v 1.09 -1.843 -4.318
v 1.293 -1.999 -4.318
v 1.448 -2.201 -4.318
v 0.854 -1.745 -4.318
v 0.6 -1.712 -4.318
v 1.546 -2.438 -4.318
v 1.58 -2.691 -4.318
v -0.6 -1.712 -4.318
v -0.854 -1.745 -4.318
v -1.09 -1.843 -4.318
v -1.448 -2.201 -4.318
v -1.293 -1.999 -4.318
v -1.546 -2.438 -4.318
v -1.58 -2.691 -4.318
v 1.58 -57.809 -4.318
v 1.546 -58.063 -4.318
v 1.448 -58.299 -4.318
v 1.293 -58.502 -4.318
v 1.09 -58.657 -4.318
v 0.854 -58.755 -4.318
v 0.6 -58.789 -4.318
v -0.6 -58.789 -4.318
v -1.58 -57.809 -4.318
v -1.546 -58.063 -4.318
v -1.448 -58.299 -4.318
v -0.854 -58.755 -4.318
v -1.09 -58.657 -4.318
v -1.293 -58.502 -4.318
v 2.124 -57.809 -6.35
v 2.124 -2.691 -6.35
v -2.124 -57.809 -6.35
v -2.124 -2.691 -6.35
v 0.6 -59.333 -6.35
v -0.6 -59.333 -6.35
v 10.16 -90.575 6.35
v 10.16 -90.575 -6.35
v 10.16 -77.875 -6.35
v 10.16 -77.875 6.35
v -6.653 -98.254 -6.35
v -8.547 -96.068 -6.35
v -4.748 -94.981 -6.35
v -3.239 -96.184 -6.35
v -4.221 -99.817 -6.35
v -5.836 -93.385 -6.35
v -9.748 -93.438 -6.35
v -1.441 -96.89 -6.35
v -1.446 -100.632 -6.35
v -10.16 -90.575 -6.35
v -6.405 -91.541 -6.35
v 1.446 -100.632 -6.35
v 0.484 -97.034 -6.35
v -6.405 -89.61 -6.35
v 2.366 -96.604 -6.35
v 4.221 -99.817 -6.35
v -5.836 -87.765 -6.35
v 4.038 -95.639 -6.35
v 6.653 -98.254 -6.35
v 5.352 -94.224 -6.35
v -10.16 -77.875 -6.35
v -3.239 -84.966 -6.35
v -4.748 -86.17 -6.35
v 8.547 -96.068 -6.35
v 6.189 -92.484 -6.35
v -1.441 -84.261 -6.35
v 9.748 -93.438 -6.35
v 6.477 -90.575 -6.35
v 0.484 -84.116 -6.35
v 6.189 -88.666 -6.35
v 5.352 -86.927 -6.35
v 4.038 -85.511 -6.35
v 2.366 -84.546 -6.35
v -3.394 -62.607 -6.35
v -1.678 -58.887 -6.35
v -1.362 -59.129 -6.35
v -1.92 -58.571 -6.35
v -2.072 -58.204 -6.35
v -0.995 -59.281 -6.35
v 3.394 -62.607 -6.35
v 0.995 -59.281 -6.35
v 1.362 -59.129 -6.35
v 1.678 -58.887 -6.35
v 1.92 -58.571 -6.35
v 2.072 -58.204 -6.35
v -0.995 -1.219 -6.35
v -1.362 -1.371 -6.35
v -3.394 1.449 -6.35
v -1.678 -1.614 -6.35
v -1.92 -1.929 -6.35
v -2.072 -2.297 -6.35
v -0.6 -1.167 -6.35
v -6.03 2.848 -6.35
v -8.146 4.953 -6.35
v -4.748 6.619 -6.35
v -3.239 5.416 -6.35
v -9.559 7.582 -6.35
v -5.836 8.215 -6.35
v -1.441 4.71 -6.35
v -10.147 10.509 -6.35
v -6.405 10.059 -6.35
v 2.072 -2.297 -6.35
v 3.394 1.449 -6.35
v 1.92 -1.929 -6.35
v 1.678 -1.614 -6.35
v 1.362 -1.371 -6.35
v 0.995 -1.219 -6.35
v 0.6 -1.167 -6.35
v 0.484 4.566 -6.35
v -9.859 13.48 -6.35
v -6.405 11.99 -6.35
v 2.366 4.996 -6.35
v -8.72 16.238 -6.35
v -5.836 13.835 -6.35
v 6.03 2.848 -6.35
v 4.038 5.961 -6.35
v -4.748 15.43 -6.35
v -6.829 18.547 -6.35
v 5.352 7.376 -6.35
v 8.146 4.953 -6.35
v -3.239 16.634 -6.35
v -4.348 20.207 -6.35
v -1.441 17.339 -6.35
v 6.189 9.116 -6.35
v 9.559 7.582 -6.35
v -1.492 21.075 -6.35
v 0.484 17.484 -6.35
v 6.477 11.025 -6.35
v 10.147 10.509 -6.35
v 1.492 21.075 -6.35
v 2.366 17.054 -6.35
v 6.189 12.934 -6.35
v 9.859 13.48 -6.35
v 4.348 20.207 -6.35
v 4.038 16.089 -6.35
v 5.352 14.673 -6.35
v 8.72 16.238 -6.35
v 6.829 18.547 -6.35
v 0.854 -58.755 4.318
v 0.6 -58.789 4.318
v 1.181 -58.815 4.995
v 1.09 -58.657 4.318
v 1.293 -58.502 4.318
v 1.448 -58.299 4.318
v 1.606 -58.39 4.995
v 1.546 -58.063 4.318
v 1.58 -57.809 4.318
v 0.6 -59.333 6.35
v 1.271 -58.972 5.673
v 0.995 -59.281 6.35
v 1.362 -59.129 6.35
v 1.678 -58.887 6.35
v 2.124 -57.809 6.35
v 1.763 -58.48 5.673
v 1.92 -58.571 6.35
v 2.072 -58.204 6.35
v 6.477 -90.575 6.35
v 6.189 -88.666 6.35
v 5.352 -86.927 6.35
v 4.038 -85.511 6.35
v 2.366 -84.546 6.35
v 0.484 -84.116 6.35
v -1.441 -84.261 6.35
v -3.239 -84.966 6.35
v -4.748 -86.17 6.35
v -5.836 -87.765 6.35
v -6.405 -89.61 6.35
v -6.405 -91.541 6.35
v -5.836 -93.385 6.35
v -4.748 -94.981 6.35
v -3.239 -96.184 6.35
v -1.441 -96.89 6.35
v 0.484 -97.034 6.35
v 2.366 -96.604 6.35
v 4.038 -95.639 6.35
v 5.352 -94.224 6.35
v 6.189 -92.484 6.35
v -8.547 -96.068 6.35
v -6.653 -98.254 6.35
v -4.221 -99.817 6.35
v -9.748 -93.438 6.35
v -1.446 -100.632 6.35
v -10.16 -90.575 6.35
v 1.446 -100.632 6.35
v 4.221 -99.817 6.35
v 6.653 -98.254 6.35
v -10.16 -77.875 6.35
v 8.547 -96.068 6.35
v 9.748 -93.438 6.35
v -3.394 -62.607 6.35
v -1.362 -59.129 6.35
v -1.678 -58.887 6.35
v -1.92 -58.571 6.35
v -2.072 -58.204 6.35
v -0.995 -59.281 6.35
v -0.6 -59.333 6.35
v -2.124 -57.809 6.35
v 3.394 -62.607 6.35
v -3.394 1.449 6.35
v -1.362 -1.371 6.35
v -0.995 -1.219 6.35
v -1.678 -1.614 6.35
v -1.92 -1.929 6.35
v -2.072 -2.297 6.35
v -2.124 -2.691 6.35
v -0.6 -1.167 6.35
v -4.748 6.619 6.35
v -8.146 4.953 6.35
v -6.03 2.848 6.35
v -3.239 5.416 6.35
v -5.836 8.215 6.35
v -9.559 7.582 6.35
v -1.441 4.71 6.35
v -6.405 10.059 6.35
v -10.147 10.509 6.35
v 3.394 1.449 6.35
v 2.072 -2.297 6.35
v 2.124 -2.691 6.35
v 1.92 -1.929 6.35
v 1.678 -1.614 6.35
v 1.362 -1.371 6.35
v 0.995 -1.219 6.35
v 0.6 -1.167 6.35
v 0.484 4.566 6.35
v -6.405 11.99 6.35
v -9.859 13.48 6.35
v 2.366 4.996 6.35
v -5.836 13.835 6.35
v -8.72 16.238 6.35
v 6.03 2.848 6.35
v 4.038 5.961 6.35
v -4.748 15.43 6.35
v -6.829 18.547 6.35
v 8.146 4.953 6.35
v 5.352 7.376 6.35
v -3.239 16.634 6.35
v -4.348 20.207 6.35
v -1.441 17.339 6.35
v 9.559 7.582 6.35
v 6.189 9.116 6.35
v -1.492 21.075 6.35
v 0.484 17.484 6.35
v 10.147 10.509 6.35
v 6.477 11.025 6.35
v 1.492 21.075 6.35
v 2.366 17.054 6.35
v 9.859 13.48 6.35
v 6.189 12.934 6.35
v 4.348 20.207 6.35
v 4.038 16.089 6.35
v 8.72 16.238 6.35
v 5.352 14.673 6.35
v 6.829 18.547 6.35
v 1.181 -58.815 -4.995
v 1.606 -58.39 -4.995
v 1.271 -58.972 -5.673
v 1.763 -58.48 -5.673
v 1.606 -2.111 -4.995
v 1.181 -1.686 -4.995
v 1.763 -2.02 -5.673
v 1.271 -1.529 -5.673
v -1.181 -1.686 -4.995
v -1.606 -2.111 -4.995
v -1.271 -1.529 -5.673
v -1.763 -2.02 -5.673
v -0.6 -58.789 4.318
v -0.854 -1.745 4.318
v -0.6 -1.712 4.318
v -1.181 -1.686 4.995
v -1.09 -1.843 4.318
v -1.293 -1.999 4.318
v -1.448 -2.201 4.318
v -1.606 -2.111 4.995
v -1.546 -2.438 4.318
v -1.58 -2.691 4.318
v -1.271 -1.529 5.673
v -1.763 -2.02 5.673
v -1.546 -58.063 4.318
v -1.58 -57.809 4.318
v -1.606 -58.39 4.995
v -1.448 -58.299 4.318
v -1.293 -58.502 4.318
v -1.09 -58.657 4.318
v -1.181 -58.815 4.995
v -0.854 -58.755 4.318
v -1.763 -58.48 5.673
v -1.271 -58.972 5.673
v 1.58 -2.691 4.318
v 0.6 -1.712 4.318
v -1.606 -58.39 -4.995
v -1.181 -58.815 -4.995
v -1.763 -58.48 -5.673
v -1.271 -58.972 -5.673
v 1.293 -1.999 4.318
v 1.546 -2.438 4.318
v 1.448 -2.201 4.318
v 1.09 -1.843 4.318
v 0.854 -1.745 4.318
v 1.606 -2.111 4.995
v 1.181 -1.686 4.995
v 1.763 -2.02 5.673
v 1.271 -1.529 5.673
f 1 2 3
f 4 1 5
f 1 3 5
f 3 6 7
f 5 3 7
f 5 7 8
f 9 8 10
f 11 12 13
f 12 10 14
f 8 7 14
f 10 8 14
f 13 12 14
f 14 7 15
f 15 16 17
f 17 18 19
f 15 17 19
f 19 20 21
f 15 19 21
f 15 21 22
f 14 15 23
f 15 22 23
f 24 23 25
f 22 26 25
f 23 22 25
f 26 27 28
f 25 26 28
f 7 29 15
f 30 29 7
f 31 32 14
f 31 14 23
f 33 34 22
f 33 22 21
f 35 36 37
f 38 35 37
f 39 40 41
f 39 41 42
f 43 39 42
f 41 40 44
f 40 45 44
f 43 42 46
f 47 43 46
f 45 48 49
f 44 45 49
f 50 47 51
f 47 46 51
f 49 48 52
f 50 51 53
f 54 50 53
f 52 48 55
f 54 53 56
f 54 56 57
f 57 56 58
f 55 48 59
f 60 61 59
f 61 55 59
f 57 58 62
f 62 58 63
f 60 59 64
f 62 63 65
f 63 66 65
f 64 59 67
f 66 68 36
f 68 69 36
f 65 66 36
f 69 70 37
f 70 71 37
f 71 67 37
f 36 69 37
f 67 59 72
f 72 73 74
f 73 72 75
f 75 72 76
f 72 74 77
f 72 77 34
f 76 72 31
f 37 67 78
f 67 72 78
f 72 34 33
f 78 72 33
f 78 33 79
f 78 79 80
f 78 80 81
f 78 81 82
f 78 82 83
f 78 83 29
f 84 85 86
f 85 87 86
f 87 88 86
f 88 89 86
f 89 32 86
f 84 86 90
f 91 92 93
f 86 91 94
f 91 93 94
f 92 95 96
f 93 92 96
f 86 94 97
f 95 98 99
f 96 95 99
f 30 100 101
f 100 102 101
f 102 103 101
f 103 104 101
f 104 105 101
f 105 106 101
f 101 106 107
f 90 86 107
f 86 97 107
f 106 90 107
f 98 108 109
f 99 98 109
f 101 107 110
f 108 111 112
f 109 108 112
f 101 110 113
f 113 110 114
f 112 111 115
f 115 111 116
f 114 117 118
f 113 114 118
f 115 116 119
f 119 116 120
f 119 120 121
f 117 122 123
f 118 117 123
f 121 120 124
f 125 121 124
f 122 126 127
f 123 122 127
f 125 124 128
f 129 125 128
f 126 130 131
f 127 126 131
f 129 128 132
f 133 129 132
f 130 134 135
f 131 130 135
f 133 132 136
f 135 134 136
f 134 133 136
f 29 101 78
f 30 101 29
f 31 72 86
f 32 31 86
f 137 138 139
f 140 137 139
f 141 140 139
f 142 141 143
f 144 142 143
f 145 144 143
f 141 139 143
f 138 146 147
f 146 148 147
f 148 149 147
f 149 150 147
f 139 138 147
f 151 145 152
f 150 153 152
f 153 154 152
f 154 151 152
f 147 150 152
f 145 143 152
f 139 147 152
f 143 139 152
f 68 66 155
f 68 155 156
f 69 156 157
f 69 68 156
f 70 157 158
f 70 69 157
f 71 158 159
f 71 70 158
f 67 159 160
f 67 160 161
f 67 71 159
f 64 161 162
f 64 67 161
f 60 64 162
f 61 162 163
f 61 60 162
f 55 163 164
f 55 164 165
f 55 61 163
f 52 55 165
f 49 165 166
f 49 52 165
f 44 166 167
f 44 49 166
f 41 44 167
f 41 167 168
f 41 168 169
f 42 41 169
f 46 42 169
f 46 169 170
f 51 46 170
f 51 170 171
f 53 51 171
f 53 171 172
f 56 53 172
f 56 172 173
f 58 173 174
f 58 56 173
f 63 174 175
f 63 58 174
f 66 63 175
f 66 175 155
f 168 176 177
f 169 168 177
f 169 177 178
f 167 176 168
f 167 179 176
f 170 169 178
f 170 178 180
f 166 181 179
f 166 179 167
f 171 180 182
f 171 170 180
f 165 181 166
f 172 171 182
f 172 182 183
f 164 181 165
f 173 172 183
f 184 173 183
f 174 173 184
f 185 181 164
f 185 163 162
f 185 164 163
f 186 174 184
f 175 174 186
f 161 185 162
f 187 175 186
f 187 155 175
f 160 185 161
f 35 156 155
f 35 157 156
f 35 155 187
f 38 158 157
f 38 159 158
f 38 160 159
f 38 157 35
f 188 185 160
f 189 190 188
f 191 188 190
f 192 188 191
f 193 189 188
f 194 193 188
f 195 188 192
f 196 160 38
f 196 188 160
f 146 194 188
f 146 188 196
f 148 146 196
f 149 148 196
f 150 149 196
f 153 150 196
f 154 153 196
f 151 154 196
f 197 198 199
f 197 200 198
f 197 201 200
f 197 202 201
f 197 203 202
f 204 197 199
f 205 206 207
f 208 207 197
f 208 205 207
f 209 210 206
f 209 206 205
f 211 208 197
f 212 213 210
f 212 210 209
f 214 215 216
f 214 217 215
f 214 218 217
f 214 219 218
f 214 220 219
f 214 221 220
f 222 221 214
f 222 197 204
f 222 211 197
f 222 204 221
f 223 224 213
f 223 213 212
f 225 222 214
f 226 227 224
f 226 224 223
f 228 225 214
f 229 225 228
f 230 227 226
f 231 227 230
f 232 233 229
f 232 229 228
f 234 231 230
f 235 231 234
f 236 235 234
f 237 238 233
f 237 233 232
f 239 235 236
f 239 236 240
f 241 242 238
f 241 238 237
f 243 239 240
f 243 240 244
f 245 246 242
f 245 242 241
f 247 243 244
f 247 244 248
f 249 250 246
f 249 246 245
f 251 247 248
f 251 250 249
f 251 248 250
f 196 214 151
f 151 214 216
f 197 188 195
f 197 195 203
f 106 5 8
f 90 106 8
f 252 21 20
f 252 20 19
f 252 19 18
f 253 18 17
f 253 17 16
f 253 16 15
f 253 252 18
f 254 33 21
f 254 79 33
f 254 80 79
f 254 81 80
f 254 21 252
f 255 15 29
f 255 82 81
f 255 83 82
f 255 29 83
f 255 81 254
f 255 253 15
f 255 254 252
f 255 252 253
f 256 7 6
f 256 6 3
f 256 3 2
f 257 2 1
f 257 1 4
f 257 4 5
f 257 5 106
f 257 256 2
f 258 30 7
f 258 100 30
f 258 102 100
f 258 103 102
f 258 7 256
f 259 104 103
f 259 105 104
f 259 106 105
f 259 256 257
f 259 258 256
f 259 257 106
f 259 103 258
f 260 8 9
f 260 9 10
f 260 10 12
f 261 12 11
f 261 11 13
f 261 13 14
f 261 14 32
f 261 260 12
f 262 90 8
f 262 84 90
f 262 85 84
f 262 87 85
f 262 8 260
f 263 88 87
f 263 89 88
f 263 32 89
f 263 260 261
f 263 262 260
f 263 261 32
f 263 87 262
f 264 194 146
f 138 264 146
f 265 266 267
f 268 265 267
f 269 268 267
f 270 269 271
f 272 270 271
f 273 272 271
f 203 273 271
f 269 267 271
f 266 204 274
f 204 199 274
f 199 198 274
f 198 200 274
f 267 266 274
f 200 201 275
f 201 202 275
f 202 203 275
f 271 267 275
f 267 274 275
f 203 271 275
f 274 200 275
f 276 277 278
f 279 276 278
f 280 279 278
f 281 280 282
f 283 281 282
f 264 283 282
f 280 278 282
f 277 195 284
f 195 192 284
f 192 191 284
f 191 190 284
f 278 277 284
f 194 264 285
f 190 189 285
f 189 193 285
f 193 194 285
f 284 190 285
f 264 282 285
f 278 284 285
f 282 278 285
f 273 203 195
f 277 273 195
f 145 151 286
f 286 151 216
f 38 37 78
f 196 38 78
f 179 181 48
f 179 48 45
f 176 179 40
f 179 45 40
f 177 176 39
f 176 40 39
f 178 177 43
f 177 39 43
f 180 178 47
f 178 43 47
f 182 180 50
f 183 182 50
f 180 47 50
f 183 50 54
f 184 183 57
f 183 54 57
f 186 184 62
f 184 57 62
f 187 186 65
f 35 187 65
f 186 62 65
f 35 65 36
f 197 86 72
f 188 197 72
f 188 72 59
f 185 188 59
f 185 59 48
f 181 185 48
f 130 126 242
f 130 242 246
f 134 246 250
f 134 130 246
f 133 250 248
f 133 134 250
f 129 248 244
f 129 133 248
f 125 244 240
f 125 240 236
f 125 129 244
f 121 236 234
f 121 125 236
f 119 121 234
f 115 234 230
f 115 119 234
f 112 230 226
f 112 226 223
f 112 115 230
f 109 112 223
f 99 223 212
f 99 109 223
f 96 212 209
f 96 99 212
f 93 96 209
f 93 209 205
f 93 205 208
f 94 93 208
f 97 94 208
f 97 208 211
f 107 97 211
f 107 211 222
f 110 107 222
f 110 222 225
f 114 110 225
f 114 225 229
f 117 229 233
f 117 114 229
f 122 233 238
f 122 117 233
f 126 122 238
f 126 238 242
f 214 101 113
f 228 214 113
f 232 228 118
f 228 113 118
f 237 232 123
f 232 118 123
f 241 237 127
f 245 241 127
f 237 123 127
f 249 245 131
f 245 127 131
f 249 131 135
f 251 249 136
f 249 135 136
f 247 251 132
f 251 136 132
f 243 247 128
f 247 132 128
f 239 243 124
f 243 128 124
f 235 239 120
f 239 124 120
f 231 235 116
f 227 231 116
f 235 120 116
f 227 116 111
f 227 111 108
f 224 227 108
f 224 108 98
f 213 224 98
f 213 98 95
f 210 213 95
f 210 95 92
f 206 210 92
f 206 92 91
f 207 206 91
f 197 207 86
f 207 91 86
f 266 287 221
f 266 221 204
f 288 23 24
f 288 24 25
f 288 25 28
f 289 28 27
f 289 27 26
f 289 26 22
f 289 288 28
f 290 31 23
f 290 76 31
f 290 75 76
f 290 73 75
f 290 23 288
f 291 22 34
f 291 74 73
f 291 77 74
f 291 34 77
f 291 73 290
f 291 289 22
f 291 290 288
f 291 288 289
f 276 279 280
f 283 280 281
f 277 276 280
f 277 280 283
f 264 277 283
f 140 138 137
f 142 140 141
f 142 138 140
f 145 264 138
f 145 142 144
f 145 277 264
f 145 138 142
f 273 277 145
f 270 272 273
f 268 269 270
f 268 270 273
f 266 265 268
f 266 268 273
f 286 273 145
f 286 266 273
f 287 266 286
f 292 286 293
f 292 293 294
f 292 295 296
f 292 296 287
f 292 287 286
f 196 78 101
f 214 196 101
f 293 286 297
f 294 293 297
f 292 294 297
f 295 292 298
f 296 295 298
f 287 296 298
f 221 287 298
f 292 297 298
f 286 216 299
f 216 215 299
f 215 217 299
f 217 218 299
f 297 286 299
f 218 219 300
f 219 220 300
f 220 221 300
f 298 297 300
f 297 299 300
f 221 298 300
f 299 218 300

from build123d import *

# Parameters (mm, degrees)
BOSS_EXTRUDE5_DEPTH      = 6.35
BOSS_EXTRUDE5_DEPTH_BACK = 6.35
SKETCH2_R                = 6.477
CUT_EXTRUDE1_DEPTH       = 2.032
CUT_EXTRUDE1_DRAFT       = -15
MIRROR1_COPY_1_DEPTH     = 2.032
MIRROR1_COPY_1_DRAFT     = -15


with BuildPart() as part:
    # Sketch2 → Boss-Extrude5 (new, two sides: drawn at the far end of the back side and taken through both)
    with BuildSketch(Plane.XY.offset(-BOSS_EXTRUDE5_DEPTH_BACK)):
        with BuildLine():
            Line((10.16, -90.575195917), (10.16, -77.875195917))
            Line((10.16, -77.875195917), (3.394151371, -62.607190679))
            Line((3.394151371, -62.607190679), (3.394151371, 1.448513754))
            ThreePointArc((3.394151371, 1.448513754), (0, 21.184804083), (-3.394151371, 1.448513754))
            Line((-3.394151371, 1.448513754), (-3.394151371, -62.607190679))
            Line((-3.394151371, -62.607190679), (-10.16, -77.875195917))
            Line((-10.16, -77.875195917), (-10.16, -90.575195917))
            ThreePointArc((-10.16, -90.575195917), (0, -100.735195917), (10.16, -90.575195917))
        make_face()
        with Locations((0, 11.024804083)):
            Circle(SKETCH2_R, mode=Mode.SUBTRACT)
        with Locations((0, -90.575195917)):
            Circle(SKETCH2_R, mode=Mode.SUBTRACT)
    extrude(amount=BOSS_EXTRUDE5_DEPTH + BOSS_EXTRUDE5_DEPTH_BACK)


with BuildPart() as cut_extrude1_tool:
    # Sketch3 → Cut-Extrude1 (with draft: the straight prism first)
    with BuildSketch(Plane.XY.offset(6.35)):
        with BuildLine():
            ThreePointArc((2.124155322, -2.691195917), (1.677786057, -1.613565183), (0.600155322, -1.167195917))
            Line((0.600155322, -1.167195917), (-0.600155322, -1.167195917))
            ThreePointArc((-0.600155322, -1.167195917), (-1.677786057, -1.613565183), (-2.124155322, -2.691195917))
            Line((-2.124155322, -2.691195917), (-2.124155322, -57.809195917))
            ThreePointArc((-2.124155322, -57.809195917), (-1.677786057, -58.886826652), (-0.600155322, -59.333195917))
            Line((-0.600155322, -59.333195917), (0.600155322, -59.333195917))
            ThreePointArc((0.600155322, -59.333195917), (1.677786057, -58.886826652), (2.124155322, -57.809195917))
            Line((2.124155322, -57.809195917), (2.124155322, -2.691195917))
        make_face()
    extrude(amount=-CUT_EXTRUDE1_DEPTH)
    # Cut-Extrude1: the draft: its side faces are tilted about the plane it starts from
    cut_extrude1_sides = [cut_extrude1_tool.faces().sort_by_distance(p)[0] for p in [
        (2.124155322, -30.250195917, 5.334),
        (1.677786057, -1.613565183, 5.334),
        (0, -1.167195917, 5.334),
        (-1.677786057, -1.613565183, 5.334),
        (-2.124155322, -30.250195917, 5.334),
        (-1.677786057, -58.886826652, 5.334),
        (0, -59.333195917, 5.334),
        (1.677786057, -58.886826652, 5.334),
    ]]
    draft(cut_extrude1_sides, Plane.XY.offset(6.35), CUT_EXTRUDE1_DRAFT)


with BuildPart() as part_1:
    add(part.part)

    # Cut-Extrude1: cut by cut_extrude1_tool
    add(cut_extrude1_tool.part, mode=Mode.SUBTRACT)


with BuildPart() as mirror1_copy_1_tool:
    # Mirror1 copy 1 sketch → Mirror1 copy 1 (with draft: the straight prism first)
    with BuildSketch(Plane(origin=(0, 0, -6.35), x_dir=(1, 0, 0), z_dir=(0, 0, -1))):
        with BuildLine():
            ThreePointArc((2.124155322, 2.691195917), (1.677786057, 1.613565183), (0.600155322, 1.167195917))
            Line((0.600155322, 1.167195917), (-0.600155322, 1.167195917))
            ThreePointArc((-0.600155322, 1.167195917), (-1.677786057, 1.613565183), (-2.124155322, 2.691195917))
            Line((-2.124155322, 2.691195917), (-2.124155322, 57.809195917))
            ThreePointArc((-2.124155322, 57.809195917), (-1.677786057, 58.886826652), (-0.600155322, 59.333195917))
            Line((-0.600155322, 59.333195917), (0.600155322, 59.333195917))
            ThreePointArc((0.600155322, 59.333195917), (1.677786057, 58.886826652), (2.124155322, 57.809195917))
            Line((2.124155322, 57.809195917), (2.124155322, 2.691195917))
        make_face()
    extrude(amount=-MIRROR1_COPY_1_DEPTH)
    # Mirror1 copy 1: the draft: its side faces are tilted about the plane it starts from
    mirror1_copy_1_sides = [mirror1_copy_1_tool.faces().sort_by_distance(p)[0] for p in [
        (2.124155322, -30.250195917, -5.334),
        (1.677786057, -1.613565183, -5.334),
        (0, -1.167195917, -5.334),
        (-1.677786057, -1.613565183, -5.334),
        (-2.124155322, -30.250195917, -5.334),
        (-1.677786057, -58.886826652, -5.334),
        (0, -59.333195917, -5.334),
        (1.677786057, -58.886826652, -5.334),
    ]]
    draft(mirror1_copy_1_sides, Plane(origin=(0, 0, -6.35), x_dir=(1, 0, 0), z_dir=(0, 0, -1)), MIRROR1_COPY_1_DRAFT)


with BuildPart() as part_2:
    add(part_1.part)

    # Mirror1 copy 1: cut by mirror1_copy_1_tool
    add(mirror1_copy_1_tool.part, mode=Mode.SUBTRACT)


solid = part_2.part
